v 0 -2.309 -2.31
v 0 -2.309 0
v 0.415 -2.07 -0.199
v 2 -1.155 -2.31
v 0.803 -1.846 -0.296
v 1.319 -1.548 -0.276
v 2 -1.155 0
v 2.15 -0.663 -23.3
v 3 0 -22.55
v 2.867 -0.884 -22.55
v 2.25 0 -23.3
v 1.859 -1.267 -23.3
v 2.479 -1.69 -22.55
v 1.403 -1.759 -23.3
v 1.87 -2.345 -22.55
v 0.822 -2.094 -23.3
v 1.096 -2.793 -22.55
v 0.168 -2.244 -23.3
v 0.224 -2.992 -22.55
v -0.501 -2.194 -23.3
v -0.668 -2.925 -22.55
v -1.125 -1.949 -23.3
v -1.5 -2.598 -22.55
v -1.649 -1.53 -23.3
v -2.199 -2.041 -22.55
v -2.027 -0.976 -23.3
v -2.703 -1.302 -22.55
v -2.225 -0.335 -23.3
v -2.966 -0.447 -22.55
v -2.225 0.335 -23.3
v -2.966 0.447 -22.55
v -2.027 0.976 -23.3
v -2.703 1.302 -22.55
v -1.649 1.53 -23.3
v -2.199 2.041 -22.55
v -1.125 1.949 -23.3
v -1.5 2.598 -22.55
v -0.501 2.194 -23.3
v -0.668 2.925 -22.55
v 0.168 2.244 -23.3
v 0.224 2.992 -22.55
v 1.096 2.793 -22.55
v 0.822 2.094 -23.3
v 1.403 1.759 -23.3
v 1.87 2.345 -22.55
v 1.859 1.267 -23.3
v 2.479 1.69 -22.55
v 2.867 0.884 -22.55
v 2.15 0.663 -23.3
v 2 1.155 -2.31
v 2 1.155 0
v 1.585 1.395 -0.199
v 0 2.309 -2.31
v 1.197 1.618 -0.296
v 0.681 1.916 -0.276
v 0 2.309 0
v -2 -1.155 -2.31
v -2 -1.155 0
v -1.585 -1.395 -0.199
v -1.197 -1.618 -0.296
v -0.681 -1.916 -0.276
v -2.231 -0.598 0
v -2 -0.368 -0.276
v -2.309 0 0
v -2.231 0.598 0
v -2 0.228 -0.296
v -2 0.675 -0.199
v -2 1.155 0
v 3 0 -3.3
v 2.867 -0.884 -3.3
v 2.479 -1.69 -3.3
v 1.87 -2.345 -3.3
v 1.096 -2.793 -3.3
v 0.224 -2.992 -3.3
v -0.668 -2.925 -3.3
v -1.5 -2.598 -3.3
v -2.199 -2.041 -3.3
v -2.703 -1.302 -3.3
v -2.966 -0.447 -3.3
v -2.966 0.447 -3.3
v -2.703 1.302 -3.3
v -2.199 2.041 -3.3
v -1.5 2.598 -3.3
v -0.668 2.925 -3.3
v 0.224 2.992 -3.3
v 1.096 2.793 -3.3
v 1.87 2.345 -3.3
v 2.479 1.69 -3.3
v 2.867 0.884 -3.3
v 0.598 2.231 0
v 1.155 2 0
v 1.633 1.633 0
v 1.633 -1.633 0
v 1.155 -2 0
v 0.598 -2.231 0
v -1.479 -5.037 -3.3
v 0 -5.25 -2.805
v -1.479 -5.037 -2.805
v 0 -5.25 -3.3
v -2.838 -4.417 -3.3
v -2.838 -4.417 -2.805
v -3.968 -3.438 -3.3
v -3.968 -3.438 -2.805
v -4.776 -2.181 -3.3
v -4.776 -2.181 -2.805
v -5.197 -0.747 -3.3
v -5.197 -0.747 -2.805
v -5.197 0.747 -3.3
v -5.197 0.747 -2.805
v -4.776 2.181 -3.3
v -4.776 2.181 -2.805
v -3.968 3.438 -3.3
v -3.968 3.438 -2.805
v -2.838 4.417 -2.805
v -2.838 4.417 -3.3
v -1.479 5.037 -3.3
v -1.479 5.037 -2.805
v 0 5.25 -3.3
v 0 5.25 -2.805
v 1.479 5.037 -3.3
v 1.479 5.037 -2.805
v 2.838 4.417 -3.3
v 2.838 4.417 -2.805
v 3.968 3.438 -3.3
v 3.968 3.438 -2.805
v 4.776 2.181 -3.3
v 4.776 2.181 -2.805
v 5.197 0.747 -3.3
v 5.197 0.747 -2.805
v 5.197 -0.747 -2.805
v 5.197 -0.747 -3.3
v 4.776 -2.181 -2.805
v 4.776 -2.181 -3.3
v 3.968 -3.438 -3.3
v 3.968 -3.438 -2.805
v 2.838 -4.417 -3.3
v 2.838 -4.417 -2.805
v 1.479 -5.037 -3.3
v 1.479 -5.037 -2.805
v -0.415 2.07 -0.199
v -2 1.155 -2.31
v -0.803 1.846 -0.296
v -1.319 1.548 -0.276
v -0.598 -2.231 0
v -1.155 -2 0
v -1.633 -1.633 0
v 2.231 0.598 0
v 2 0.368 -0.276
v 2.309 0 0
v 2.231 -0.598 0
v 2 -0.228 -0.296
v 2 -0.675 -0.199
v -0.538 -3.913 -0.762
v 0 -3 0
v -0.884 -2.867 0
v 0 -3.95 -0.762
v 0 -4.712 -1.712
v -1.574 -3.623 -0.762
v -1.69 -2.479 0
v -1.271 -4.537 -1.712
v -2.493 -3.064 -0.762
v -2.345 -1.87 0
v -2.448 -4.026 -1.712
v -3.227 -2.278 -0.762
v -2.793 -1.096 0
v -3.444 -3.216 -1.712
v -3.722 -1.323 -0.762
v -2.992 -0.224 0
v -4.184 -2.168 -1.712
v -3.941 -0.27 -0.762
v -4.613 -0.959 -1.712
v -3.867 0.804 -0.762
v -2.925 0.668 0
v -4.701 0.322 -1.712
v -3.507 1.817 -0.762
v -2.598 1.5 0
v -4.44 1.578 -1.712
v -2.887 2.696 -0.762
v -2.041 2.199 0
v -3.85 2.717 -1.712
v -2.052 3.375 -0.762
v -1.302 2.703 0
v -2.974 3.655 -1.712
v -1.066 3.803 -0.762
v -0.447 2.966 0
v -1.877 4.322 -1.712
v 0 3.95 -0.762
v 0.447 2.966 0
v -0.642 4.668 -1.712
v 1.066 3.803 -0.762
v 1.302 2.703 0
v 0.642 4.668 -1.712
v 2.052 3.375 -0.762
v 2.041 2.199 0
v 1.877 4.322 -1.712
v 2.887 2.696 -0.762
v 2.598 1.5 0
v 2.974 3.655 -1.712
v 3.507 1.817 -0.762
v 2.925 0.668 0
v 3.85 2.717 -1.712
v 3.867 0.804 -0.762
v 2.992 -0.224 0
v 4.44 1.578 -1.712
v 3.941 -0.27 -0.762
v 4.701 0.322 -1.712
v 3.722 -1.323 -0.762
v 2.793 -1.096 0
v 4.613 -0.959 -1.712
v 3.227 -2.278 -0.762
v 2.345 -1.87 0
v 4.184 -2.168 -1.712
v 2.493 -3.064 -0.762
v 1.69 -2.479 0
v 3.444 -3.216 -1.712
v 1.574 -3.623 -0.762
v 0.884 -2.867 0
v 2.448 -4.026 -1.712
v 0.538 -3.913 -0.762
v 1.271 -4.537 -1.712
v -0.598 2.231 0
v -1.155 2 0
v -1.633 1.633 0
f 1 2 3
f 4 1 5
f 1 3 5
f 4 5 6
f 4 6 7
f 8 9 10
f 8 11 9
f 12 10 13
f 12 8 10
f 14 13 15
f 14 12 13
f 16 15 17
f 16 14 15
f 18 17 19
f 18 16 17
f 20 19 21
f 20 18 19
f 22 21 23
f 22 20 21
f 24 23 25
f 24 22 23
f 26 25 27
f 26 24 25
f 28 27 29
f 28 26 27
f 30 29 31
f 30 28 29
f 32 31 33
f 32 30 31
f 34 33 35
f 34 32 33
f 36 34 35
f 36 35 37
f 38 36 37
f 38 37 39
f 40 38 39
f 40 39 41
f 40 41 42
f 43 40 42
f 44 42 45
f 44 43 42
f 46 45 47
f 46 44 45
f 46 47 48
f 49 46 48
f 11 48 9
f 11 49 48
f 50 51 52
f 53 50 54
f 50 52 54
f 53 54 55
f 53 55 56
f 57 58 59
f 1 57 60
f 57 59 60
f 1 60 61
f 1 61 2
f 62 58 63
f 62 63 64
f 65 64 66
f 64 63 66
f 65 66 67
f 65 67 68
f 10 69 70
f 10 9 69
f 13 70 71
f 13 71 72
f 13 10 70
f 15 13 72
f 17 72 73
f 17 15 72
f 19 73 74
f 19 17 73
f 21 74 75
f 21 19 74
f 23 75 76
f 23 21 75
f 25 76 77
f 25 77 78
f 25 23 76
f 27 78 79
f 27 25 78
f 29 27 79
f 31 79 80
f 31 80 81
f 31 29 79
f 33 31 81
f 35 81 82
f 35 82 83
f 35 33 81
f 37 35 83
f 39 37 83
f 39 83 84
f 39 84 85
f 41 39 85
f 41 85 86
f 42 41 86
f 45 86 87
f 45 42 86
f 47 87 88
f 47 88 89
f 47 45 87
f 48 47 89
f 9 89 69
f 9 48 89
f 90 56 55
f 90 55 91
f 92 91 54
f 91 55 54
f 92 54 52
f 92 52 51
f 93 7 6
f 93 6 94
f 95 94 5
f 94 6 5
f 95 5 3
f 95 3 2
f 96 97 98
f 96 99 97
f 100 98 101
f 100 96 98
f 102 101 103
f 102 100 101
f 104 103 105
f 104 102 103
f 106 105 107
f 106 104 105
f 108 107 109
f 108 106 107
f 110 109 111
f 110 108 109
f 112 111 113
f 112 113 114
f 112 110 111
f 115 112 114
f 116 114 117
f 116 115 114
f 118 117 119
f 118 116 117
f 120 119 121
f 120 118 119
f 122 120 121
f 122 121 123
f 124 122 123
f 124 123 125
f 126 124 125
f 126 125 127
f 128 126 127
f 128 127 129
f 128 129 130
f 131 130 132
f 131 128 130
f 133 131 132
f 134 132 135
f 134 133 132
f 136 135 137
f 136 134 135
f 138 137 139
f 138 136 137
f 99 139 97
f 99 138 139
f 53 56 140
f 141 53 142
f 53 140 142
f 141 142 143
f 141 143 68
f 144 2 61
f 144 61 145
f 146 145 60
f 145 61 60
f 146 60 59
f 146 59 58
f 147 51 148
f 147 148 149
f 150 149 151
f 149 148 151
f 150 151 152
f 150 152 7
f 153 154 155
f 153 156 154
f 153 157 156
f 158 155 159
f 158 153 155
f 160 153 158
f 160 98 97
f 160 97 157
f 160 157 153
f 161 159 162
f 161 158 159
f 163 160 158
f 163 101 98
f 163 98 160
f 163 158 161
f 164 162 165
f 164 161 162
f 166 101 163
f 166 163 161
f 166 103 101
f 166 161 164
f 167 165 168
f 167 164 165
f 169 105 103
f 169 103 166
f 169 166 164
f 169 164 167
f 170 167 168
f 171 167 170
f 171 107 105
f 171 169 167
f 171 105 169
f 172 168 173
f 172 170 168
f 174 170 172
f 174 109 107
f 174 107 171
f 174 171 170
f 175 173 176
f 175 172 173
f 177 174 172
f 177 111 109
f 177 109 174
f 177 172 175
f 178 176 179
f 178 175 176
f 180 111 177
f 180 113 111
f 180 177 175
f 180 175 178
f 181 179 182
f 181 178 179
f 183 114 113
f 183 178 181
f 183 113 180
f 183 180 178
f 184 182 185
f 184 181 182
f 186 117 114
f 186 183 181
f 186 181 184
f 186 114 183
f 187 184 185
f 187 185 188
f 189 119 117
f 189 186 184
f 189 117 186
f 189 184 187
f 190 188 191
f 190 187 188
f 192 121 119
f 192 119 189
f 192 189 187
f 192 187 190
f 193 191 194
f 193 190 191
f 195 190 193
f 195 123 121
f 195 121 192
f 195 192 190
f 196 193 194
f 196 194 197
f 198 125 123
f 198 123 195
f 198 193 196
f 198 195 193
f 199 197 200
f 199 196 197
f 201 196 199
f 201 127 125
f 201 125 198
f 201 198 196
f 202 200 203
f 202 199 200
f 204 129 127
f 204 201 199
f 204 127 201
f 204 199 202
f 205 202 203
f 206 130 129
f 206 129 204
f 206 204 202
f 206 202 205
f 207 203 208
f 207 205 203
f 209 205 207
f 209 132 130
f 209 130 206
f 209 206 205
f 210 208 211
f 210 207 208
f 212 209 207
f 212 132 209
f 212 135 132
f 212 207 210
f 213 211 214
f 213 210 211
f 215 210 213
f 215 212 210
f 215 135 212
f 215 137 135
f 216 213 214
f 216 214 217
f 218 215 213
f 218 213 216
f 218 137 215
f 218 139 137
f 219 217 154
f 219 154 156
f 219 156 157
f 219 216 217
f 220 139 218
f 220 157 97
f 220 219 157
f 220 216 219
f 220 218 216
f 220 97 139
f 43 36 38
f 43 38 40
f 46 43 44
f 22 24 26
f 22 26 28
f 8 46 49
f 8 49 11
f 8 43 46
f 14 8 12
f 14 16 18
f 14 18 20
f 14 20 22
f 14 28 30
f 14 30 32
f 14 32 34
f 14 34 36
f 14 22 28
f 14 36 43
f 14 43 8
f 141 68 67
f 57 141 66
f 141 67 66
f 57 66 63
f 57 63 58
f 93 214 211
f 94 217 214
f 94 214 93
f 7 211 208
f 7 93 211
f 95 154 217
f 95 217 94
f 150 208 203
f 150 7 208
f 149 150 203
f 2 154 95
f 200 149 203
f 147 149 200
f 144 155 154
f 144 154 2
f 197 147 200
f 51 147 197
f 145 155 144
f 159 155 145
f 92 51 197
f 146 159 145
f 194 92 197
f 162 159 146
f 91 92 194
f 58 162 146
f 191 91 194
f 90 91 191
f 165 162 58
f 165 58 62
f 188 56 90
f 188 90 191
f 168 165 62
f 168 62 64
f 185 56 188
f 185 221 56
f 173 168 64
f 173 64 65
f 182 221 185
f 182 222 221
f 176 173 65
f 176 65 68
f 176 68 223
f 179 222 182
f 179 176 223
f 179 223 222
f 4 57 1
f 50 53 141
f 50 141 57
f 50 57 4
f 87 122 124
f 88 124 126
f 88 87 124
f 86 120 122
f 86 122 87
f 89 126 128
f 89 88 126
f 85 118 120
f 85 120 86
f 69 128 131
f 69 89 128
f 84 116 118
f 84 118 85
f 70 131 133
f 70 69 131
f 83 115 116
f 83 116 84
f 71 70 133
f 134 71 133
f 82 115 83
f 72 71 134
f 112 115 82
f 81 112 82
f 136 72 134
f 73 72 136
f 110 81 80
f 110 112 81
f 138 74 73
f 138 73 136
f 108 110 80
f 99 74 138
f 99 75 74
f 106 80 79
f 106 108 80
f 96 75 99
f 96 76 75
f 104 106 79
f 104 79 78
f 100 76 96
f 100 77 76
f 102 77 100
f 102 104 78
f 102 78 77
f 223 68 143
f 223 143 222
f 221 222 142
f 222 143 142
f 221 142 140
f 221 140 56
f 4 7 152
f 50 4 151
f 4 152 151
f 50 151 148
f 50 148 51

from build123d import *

# Parameters (mm, degrees)
CUT_EXTRUDE2_DEPTH = 2.31


with BuildPart() as part:
    # Sketch10 → Revolve3 (revolve)
    with BuildSketch(Plane(origin=(0, 0, 0), x_dir=(0, 0, -1), z_dir=(1, 0, 0)), mode=Mode.PRIVATE) as revolve3_sk:
        Polygon((22.55, 3), (23.3, 2.25), (23.3, 0), (3.3, 0), (3.3, 3), align=None)
    revolve(revolve3_sk.sketch.rotate(Axis((0, 0, 0), (0, 0, -1)), 90), axis=Axis((0, 0, 0), (0, 0, -1)))

    # Sketch7 → Revolve2 (revolve)
    with BuildSketch(Plane(origin=(0, 0, 0), x_dir=(0, 0, -1), z_dir=(1, 0, 0)), mode=Mode.PRIVATE) as revolve2_sk:
        with BuildLine():
            Line((2.805, 5.25), (3.3, 5.25))
            Line((3.3, 5.25), (3.3, 0))
            Line((3.3, 0), (0, 0))
            Line((0, 0), (0, 3))
            ThreePointArc((0, 3), (1.216479019, 4.356906156), (2.805, 5.25))
        make_face()
    revolve(revolve2_sk.sketch.rotate(Axis((0, 0, 0), (0, 0, -1)), 180), axis=Axis((0, 0, 0), (0, 0, -1)))

    # Sketch5 → Cut-Extrude2 (cut)
    with BuildSketch(Plane.XY):
        Polygon((2, -1.154700538), (2, 1.154700538), (0, 2.309401077), (-2, 1.154700538), (-2, -1.154700538), (0, -2.309401077), align=None)
    extrude(amount=-CUT_EXTRUDE2_DEPTH, mode=Mode.SUBTRACT)

    # Cut-Extrude3 cone 1 section (through the dimple's axis) → Cut-Extrude3 (revolve, cut)
    with BuildSketch(Plane(origin=(0, 0, 0), x_dir=(0, -1, 0), z_dir=(1, 0, 0))):
        Polygon((0, 0), (2.309401077, 0), (0, 2.309401077), align=None)
    revolve(axis=Axis((0, 0, 0), (0, 0, -1)), mode=Mode.SUBTRACT)


with BuildPart() as body_2:
    # Split1: read off the stored shape, not the designer's step
    # Split1: the piece on the far side of the plane
    add(part.part)
    split(bisect_by=Plane.XY.offset(-3.3), keep=Keep.BOTTOM)


with BuildPart() as part_1:
    add(part.part)

    # Split1
    split(bisect_by=Plane.XY.offset(-3.3), keep=Keep.TOP)


with BuildPart() as body_2_1:
    add(body_2.part)

    # Boss-Extrude1: read off the stored shape, not the designer's step
    # Boss-Extrude1: union part
    add(part_1.part)


solid = body_2_1.part
